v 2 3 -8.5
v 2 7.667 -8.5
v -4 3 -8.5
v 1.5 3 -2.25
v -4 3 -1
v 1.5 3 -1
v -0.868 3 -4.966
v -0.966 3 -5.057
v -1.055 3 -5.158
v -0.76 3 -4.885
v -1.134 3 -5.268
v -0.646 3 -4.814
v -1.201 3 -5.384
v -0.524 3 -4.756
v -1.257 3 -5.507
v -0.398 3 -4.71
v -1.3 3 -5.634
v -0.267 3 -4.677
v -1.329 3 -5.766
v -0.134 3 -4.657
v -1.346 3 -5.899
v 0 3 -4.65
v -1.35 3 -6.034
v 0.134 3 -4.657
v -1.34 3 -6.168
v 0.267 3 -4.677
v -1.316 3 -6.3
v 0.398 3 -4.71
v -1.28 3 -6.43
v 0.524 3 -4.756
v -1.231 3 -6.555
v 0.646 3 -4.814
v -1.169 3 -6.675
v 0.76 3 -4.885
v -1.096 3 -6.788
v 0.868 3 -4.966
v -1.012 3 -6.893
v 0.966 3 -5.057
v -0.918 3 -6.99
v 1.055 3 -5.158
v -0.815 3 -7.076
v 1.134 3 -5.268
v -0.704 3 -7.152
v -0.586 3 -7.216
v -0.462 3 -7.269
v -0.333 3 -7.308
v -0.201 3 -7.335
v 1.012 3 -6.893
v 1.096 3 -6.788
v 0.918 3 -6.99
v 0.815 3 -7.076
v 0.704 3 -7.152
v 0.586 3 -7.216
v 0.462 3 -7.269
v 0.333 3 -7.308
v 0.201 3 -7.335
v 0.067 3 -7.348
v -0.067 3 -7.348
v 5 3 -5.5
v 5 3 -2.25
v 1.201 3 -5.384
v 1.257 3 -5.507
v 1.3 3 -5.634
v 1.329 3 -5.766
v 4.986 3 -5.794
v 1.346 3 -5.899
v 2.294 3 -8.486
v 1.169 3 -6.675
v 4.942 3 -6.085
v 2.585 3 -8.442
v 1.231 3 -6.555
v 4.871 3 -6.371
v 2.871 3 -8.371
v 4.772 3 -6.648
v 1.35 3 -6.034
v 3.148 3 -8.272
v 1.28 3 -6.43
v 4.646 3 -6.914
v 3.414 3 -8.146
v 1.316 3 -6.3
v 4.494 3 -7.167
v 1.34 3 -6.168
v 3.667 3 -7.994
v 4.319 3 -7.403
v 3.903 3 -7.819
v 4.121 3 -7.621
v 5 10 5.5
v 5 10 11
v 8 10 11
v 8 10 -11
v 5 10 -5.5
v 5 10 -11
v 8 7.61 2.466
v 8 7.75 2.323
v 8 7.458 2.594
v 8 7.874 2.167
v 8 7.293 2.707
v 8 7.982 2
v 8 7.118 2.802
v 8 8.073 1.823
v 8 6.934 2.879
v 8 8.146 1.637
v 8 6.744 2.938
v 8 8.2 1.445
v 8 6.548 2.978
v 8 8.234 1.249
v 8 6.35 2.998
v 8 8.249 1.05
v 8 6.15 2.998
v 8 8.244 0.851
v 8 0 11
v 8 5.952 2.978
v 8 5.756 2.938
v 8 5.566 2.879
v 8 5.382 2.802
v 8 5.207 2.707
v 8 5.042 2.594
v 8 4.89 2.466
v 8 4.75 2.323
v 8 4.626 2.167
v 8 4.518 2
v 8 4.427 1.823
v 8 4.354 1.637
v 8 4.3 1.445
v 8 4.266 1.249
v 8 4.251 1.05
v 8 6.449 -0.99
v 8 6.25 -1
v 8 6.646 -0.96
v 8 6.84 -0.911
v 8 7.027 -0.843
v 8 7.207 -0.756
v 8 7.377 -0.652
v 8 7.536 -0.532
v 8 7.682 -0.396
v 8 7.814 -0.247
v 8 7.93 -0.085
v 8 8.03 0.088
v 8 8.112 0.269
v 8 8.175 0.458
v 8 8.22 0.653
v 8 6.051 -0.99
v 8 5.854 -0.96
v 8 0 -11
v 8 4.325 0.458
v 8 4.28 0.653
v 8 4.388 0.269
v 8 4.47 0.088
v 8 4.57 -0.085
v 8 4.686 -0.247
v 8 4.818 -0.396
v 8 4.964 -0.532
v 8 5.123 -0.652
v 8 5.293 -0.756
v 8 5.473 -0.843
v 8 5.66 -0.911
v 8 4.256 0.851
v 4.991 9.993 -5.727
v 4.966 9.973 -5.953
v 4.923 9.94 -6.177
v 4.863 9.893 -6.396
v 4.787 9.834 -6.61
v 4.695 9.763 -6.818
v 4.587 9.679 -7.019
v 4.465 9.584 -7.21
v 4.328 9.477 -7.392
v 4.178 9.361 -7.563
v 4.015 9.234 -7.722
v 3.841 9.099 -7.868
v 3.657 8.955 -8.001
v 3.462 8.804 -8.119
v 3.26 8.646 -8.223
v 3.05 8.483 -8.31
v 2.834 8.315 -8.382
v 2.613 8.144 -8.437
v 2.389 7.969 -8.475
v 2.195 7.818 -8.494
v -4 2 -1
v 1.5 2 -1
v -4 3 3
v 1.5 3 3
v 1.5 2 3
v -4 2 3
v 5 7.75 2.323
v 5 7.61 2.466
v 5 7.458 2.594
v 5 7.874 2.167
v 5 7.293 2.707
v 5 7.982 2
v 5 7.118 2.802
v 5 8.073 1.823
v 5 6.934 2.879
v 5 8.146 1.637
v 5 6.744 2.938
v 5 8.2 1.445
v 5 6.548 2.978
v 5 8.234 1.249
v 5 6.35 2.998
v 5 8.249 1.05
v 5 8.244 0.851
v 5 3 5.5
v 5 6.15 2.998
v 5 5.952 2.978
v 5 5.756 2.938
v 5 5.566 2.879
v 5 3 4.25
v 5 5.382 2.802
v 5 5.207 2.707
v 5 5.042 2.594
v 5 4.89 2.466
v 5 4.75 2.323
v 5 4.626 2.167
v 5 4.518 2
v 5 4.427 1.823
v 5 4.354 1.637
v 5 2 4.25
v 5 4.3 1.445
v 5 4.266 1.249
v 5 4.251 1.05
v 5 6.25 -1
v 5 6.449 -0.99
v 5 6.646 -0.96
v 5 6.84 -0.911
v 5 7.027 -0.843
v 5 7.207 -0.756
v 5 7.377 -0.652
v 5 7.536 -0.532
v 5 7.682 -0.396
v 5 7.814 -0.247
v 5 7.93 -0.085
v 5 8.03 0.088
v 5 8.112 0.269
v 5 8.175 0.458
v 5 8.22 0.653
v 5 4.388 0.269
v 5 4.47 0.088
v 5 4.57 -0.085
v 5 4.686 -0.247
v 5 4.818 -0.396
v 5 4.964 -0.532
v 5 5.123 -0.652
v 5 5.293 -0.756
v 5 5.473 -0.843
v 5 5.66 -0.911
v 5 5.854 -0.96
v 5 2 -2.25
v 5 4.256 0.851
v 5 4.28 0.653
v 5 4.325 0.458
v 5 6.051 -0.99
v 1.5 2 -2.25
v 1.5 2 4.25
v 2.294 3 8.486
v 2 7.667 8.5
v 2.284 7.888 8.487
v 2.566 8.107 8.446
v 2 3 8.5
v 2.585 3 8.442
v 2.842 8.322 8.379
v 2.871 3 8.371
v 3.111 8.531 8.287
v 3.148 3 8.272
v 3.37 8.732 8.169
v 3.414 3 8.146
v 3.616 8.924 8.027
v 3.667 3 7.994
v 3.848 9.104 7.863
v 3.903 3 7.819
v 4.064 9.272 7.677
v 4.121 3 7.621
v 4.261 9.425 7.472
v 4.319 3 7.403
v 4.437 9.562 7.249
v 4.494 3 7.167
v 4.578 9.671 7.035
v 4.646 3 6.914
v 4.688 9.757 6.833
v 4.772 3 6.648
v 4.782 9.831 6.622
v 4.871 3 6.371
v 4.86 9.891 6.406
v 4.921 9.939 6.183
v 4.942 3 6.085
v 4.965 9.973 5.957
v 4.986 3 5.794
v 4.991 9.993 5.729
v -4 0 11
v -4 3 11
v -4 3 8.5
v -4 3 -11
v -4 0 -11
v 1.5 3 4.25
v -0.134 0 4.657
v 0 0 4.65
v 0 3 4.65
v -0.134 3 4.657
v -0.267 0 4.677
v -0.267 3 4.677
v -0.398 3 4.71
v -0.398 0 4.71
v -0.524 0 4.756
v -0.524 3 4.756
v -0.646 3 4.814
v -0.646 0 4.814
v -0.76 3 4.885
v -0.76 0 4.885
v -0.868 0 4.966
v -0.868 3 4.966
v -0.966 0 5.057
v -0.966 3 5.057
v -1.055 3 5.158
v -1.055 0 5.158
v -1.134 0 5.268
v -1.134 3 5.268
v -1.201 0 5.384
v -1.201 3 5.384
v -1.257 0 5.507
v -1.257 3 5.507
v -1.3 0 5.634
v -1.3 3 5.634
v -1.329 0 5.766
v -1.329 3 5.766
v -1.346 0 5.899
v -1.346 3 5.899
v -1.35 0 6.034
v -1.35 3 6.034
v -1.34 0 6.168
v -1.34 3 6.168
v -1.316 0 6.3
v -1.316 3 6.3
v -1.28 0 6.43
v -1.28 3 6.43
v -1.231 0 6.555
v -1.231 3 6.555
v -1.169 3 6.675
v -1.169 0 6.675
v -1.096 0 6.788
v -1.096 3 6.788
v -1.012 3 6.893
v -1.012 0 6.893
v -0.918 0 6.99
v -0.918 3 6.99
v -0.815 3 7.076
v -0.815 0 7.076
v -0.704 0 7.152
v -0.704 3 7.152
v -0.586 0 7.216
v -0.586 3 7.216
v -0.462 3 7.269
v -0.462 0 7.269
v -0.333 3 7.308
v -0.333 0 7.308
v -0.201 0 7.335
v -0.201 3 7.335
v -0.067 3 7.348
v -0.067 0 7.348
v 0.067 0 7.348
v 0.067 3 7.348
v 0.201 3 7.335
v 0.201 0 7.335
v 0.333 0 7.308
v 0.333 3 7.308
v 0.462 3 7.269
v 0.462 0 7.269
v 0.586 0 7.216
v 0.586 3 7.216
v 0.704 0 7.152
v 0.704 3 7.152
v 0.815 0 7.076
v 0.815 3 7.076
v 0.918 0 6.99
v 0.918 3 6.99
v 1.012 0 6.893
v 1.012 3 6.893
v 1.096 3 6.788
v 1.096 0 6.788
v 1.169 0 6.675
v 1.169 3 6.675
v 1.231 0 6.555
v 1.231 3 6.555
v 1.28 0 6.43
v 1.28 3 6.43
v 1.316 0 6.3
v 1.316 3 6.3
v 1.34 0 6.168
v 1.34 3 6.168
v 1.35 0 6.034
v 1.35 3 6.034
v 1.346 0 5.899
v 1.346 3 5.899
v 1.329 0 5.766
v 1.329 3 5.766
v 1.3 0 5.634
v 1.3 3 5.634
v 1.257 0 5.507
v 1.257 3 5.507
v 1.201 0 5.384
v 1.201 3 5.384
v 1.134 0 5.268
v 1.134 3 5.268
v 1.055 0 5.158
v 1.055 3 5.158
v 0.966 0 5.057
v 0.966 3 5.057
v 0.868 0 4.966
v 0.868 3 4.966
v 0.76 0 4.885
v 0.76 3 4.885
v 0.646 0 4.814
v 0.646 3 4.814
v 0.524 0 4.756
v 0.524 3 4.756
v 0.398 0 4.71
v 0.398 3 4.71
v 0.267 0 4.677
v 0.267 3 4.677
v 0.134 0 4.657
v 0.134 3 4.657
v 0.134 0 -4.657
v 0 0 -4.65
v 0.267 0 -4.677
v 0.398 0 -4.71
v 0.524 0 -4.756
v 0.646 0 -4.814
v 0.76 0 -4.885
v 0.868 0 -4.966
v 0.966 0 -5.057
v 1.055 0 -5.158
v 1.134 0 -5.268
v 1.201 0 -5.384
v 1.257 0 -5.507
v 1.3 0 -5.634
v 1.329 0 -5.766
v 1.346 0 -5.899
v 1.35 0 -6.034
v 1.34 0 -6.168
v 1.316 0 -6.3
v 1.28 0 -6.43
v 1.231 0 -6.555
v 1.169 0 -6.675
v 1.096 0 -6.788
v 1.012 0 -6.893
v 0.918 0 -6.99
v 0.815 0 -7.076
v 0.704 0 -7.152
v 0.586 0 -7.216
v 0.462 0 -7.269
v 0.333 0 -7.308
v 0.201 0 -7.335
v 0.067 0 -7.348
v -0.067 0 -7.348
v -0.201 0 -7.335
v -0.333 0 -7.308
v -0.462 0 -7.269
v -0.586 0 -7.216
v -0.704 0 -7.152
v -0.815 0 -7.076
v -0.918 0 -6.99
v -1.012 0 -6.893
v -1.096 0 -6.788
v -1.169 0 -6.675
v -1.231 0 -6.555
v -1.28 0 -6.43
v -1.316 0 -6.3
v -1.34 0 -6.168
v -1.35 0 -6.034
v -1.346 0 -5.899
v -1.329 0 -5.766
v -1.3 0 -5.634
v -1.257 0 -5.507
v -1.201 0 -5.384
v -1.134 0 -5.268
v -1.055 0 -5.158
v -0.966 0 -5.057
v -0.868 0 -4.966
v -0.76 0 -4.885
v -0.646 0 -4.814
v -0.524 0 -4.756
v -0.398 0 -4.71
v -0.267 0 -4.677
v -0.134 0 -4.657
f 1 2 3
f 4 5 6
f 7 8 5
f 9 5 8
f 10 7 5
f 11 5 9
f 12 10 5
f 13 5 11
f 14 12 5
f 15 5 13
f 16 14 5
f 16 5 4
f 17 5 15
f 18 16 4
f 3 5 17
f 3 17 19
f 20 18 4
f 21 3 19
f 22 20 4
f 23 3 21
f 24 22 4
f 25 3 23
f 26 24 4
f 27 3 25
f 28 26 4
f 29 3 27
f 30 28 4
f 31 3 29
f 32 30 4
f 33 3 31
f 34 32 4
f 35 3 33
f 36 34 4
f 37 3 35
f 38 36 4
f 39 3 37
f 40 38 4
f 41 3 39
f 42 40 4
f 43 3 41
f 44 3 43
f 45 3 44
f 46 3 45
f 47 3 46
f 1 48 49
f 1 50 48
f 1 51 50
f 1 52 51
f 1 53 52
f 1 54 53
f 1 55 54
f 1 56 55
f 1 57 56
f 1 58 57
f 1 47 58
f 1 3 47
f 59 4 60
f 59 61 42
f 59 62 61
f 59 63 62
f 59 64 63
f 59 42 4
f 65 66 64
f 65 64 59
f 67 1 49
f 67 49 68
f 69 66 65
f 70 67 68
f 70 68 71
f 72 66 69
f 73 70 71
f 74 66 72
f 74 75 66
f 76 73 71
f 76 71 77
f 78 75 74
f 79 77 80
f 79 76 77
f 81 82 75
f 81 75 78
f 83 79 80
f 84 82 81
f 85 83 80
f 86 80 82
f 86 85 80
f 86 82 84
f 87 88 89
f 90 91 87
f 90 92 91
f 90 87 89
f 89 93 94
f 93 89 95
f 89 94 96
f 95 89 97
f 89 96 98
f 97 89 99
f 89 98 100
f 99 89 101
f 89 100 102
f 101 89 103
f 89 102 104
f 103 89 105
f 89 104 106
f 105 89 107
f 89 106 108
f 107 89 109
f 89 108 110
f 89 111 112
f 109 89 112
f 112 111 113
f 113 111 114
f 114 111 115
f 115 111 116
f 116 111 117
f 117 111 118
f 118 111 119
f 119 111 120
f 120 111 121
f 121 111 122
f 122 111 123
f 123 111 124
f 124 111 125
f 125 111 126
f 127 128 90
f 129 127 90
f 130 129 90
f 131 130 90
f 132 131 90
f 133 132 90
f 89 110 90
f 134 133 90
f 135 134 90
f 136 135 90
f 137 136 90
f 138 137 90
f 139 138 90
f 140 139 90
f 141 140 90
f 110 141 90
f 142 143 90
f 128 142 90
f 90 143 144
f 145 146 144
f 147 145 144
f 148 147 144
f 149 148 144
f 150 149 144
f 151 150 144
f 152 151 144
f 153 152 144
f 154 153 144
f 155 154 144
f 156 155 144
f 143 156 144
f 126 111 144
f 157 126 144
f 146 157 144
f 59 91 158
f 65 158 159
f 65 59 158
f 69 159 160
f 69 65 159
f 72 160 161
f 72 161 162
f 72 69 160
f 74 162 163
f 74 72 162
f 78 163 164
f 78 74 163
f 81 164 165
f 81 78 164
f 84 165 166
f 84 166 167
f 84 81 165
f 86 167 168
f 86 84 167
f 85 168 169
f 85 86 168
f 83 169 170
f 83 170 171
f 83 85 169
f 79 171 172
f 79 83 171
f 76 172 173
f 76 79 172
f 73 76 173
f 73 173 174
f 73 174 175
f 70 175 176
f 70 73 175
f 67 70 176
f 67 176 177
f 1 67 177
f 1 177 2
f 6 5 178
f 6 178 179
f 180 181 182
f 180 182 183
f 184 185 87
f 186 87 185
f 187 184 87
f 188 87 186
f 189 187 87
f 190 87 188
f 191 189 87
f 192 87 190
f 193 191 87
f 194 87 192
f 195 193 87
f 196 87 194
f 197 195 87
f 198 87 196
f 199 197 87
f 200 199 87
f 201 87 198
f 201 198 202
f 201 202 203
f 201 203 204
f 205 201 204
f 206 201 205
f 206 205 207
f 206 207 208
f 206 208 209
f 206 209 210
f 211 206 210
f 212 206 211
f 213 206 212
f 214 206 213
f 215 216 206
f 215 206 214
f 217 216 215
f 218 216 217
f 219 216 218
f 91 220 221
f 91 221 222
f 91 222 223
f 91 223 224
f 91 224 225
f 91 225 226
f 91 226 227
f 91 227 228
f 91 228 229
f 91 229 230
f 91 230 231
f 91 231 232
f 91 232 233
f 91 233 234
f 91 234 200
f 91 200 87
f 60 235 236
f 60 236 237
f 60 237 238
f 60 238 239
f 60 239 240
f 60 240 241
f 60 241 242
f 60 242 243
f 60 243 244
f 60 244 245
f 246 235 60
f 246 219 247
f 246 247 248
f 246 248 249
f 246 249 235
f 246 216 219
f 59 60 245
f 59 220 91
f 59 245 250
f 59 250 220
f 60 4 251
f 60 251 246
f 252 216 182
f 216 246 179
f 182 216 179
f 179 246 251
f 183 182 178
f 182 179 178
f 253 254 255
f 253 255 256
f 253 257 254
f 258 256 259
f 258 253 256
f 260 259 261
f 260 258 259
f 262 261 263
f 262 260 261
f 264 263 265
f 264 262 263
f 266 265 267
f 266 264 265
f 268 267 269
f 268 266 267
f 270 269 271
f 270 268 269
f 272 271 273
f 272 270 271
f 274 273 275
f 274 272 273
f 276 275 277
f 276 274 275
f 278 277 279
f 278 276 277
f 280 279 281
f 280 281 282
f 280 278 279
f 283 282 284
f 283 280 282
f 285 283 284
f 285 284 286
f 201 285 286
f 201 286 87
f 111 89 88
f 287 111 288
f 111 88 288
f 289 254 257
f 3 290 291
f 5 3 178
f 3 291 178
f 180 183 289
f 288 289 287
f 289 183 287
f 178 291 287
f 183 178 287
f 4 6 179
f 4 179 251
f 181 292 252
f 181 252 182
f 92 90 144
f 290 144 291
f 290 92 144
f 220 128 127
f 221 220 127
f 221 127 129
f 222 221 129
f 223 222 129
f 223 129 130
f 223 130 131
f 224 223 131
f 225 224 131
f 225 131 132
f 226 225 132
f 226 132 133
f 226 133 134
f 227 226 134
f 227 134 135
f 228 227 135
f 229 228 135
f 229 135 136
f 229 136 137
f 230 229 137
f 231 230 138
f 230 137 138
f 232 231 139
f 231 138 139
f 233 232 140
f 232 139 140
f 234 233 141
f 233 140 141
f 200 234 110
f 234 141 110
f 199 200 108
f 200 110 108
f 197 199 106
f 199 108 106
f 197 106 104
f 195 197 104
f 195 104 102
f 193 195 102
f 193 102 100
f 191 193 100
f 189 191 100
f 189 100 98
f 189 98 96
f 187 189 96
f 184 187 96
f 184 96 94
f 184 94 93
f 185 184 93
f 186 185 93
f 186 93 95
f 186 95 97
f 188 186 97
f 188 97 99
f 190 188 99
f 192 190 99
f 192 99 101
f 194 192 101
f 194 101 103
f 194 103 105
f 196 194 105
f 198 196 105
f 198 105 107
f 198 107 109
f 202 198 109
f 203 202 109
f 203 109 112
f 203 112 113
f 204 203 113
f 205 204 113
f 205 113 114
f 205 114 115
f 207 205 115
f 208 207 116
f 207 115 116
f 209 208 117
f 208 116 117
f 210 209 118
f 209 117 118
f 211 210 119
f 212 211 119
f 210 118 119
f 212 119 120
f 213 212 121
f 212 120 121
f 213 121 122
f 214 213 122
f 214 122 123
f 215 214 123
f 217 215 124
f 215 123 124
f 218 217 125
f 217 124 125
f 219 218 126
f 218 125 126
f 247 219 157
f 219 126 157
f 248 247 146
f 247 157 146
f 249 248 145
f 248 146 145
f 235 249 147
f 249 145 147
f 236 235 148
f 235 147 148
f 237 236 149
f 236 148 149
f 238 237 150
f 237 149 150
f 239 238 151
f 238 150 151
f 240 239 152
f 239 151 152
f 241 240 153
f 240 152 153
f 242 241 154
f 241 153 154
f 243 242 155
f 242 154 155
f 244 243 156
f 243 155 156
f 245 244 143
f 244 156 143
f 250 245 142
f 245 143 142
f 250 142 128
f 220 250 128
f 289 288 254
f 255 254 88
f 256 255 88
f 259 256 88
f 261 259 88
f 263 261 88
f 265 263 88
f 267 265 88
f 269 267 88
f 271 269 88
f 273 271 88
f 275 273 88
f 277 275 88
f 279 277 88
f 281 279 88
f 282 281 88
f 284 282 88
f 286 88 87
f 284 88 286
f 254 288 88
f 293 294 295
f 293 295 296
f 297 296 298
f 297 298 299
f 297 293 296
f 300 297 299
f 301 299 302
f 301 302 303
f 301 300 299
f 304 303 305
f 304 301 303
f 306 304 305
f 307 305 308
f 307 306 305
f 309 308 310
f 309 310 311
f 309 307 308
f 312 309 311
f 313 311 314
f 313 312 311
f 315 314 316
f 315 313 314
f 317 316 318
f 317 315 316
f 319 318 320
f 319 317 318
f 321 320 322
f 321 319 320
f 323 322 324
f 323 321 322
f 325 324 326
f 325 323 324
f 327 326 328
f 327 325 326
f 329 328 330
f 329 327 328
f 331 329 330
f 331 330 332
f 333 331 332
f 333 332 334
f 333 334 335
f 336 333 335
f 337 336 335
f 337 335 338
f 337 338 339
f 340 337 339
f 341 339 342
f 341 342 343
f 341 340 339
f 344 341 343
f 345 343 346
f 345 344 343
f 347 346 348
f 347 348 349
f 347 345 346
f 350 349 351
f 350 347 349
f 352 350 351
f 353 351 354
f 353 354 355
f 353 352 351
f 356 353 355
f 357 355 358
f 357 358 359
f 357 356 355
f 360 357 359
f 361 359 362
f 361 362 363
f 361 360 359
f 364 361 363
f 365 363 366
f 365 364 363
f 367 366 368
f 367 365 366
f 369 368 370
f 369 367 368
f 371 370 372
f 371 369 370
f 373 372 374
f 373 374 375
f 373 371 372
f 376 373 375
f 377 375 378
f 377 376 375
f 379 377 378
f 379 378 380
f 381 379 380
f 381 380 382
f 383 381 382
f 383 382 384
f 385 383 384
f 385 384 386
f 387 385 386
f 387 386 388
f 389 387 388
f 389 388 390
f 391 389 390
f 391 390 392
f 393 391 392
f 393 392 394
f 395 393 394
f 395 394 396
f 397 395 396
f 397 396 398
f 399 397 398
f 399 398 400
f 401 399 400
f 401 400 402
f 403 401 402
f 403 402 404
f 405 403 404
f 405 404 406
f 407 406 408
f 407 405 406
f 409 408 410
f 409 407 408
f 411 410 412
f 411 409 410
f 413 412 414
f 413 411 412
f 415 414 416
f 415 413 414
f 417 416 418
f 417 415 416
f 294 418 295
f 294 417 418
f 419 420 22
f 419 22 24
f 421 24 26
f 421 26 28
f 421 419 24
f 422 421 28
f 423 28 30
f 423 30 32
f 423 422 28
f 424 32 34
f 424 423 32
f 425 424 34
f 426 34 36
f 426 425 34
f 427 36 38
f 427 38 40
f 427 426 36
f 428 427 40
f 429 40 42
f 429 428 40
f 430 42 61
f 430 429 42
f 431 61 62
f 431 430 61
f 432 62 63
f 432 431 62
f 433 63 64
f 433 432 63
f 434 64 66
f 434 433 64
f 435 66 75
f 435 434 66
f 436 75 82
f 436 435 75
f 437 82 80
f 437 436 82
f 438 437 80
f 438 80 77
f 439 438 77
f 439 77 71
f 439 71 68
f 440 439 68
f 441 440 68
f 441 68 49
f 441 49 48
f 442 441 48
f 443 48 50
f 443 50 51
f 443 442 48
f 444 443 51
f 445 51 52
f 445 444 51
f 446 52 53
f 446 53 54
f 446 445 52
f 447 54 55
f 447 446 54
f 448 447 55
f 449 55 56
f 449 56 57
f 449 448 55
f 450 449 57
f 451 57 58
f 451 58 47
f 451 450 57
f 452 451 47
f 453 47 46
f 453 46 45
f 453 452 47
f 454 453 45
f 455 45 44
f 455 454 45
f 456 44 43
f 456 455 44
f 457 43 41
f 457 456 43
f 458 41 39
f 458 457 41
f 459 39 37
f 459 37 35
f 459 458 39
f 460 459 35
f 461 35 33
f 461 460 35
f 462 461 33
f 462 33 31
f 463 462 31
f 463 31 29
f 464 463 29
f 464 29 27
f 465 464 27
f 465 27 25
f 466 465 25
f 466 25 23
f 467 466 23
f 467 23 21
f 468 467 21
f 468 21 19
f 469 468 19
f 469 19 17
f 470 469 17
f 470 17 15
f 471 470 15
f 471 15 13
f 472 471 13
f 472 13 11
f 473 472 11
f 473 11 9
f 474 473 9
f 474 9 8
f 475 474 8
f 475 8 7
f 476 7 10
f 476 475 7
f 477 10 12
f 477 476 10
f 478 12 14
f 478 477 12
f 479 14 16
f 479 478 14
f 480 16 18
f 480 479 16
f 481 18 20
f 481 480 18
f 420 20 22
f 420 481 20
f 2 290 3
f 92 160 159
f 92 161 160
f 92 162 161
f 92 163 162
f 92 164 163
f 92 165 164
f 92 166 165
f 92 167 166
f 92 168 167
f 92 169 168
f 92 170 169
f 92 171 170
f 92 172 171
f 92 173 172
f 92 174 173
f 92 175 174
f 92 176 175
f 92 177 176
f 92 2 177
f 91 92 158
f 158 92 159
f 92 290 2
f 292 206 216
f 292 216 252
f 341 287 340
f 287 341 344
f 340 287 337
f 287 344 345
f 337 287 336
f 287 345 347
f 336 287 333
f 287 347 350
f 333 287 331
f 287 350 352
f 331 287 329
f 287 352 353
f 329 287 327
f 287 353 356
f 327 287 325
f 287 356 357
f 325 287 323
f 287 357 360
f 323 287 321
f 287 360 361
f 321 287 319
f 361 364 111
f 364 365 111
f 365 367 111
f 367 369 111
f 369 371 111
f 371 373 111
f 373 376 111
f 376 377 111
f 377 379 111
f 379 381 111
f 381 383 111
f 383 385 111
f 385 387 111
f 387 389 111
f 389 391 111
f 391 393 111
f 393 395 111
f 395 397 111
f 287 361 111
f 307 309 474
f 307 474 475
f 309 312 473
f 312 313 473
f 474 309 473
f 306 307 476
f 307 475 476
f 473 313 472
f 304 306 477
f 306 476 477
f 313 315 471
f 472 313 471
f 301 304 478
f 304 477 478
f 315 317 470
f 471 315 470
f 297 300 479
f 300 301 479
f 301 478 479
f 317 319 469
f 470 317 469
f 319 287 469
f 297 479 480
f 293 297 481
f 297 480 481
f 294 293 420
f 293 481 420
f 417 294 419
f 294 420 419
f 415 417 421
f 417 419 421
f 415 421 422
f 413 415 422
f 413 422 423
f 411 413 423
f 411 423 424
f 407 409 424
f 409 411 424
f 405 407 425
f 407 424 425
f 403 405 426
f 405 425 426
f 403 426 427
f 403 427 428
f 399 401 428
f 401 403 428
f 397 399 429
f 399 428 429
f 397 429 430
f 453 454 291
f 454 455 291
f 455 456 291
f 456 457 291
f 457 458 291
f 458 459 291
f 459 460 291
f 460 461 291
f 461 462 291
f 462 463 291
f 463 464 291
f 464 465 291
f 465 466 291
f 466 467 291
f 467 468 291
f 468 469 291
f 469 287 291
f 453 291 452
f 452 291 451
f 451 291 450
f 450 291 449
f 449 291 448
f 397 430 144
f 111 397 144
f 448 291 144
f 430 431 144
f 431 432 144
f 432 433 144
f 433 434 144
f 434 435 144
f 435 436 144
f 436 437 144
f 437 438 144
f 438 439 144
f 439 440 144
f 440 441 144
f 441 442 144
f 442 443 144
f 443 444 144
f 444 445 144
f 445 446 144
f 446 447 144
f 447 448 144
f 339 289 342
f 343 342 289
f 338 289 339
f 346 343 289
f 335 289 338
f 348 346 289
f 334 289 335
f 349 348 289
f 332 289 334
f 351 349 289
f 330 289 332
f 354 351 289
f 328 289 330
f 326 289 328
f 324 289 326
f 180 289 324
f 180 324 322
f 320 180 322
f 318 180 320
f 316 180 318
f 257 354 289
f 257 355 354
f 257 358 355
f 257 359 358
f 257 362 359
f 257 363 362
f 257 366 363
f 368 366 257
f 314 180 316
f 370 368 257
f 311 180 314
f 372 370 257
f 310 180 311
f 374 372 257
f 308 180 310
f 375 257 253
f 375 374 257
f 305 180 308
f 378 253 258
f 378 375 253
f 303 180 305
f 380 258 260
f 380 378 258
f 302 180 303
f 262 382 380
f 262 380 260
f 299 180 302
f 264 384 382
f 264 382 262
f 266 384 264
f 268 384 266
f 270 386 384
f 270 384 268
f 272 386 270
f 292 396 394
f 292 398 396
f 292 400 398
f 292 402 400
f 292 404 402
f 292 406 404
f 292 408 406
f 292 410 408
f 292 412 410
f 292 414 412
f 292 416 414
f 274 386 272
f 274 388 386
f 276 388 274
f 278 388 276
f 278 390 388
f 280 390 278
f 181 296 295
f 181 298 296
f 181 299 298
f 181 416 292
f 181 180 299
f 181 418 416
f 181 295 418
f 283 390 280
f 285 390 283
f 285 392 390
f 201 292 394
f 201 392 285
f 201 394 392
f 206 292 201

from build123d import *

# Parameters (mm, degrees)
SKETCH_1_R          = 1.35
EXTRUDE_1_DEPTH     = 3
SKETCH_2_W          = 3
SKETCH_2_H          = 22
EXTRUDE_2_DEPTH     = 7
SKETCH_3_R          = 2
CUT_EXTRUDE_2_DEPTH = 20.104973175
EXTRUDE_3_DEPTH     = 2.5
FILLET_1_R          = 3
CUT_EXTRUDE_3_DEPTH = 1


with BuildPart() as part:
    # 草图1 → 凸台-拉伸1 (new body)
    with BuildSketch(Plane(origin=(0, 0, 0), x_dir=(1, 0, 0), z_dir=(0, 1, 0))):
        Polygon((-4, -11), (4, -11), (8, -11), (8, 11), (4, 11), (-4, 11), align=None)
        with Locations((0, 6)):
            Circle(SKETCH_1_R, mode=Mode.SUBTRACT)
        with Locations((0, -6)):
            Circle(SKETCH_1_R, mode=Mode.SUBTRACT)
    extrude(amount=EXTRUDE_1_DEPTH)

    # 草图2 → 凸台-拉伸2 (add)
    with BuildSketch(Plane(origin=(0, 3, 0), x_dir=(1, 0, 0), z_dir=(0, 1, 0))):
        with Locations((6.5, 0)):
            Rectangle(SKETCH_2_W, SKETCH_2_H)
    extrude(amount=EXTRUDE_2_DEPTH)

    # 草图3 → 切除-拉伸2 (cut, through all)
    with BuildSketch(Plane(origin=(8, 0, 0), x_dir=(0, 0, -1), z_dir=(1, 0, 0))):
        with Locations((-1, 6.25)):
            Circle(SKETCH_3_R)
    extrude(amount=-CUT_EXTRUDE_2_DEPTH, mode=Mode.SUBTRACT)

    # 草图4 → 凸台-拉伸3 (add)
    with BuildSketch(Plane(origin=(0, 0, -11), x_dir=(-1, 0, 0), z_dir=(0, 0, -1))):
        Polygon((-5, 10), (-5, 3), (4, 3), align=None)
    extrude_3 = extrude(amount=-EXTRUDE_3_DEPTH)

    # 镜向1: 凸台-拉伸3 across plane
    add(extrude_3.mirror(Plane.XY))

    # 圆角1
    fillet_1_edges = [part.edges().sort_by_distance(p)[0] for p in [
        (5, 6.5, 8.5),
        (5, 6.5, -8.5),
    ]]
    fillet(fillet_1_edges, radius=FILLET_1_R)

    # 草图5 → 切除-拉伸3 (cut)
    with BuildSketch(Plane(origin=(0, 3, 0), x_dir=(1, 0, 0), z_dir=(0, 1, 0))):
        Polygon((1.5, 2.25), (5, 2.25), (5, -4.25), (1.5, -4.25), (1.5, -3), (-4, -3), (-4, 1), (1.5, 1), align=None)
    extrude(amount=-CUT_EXTRUDE_3_DEPTH, mode=Mode.SUBTRACT)


solid = part.part
